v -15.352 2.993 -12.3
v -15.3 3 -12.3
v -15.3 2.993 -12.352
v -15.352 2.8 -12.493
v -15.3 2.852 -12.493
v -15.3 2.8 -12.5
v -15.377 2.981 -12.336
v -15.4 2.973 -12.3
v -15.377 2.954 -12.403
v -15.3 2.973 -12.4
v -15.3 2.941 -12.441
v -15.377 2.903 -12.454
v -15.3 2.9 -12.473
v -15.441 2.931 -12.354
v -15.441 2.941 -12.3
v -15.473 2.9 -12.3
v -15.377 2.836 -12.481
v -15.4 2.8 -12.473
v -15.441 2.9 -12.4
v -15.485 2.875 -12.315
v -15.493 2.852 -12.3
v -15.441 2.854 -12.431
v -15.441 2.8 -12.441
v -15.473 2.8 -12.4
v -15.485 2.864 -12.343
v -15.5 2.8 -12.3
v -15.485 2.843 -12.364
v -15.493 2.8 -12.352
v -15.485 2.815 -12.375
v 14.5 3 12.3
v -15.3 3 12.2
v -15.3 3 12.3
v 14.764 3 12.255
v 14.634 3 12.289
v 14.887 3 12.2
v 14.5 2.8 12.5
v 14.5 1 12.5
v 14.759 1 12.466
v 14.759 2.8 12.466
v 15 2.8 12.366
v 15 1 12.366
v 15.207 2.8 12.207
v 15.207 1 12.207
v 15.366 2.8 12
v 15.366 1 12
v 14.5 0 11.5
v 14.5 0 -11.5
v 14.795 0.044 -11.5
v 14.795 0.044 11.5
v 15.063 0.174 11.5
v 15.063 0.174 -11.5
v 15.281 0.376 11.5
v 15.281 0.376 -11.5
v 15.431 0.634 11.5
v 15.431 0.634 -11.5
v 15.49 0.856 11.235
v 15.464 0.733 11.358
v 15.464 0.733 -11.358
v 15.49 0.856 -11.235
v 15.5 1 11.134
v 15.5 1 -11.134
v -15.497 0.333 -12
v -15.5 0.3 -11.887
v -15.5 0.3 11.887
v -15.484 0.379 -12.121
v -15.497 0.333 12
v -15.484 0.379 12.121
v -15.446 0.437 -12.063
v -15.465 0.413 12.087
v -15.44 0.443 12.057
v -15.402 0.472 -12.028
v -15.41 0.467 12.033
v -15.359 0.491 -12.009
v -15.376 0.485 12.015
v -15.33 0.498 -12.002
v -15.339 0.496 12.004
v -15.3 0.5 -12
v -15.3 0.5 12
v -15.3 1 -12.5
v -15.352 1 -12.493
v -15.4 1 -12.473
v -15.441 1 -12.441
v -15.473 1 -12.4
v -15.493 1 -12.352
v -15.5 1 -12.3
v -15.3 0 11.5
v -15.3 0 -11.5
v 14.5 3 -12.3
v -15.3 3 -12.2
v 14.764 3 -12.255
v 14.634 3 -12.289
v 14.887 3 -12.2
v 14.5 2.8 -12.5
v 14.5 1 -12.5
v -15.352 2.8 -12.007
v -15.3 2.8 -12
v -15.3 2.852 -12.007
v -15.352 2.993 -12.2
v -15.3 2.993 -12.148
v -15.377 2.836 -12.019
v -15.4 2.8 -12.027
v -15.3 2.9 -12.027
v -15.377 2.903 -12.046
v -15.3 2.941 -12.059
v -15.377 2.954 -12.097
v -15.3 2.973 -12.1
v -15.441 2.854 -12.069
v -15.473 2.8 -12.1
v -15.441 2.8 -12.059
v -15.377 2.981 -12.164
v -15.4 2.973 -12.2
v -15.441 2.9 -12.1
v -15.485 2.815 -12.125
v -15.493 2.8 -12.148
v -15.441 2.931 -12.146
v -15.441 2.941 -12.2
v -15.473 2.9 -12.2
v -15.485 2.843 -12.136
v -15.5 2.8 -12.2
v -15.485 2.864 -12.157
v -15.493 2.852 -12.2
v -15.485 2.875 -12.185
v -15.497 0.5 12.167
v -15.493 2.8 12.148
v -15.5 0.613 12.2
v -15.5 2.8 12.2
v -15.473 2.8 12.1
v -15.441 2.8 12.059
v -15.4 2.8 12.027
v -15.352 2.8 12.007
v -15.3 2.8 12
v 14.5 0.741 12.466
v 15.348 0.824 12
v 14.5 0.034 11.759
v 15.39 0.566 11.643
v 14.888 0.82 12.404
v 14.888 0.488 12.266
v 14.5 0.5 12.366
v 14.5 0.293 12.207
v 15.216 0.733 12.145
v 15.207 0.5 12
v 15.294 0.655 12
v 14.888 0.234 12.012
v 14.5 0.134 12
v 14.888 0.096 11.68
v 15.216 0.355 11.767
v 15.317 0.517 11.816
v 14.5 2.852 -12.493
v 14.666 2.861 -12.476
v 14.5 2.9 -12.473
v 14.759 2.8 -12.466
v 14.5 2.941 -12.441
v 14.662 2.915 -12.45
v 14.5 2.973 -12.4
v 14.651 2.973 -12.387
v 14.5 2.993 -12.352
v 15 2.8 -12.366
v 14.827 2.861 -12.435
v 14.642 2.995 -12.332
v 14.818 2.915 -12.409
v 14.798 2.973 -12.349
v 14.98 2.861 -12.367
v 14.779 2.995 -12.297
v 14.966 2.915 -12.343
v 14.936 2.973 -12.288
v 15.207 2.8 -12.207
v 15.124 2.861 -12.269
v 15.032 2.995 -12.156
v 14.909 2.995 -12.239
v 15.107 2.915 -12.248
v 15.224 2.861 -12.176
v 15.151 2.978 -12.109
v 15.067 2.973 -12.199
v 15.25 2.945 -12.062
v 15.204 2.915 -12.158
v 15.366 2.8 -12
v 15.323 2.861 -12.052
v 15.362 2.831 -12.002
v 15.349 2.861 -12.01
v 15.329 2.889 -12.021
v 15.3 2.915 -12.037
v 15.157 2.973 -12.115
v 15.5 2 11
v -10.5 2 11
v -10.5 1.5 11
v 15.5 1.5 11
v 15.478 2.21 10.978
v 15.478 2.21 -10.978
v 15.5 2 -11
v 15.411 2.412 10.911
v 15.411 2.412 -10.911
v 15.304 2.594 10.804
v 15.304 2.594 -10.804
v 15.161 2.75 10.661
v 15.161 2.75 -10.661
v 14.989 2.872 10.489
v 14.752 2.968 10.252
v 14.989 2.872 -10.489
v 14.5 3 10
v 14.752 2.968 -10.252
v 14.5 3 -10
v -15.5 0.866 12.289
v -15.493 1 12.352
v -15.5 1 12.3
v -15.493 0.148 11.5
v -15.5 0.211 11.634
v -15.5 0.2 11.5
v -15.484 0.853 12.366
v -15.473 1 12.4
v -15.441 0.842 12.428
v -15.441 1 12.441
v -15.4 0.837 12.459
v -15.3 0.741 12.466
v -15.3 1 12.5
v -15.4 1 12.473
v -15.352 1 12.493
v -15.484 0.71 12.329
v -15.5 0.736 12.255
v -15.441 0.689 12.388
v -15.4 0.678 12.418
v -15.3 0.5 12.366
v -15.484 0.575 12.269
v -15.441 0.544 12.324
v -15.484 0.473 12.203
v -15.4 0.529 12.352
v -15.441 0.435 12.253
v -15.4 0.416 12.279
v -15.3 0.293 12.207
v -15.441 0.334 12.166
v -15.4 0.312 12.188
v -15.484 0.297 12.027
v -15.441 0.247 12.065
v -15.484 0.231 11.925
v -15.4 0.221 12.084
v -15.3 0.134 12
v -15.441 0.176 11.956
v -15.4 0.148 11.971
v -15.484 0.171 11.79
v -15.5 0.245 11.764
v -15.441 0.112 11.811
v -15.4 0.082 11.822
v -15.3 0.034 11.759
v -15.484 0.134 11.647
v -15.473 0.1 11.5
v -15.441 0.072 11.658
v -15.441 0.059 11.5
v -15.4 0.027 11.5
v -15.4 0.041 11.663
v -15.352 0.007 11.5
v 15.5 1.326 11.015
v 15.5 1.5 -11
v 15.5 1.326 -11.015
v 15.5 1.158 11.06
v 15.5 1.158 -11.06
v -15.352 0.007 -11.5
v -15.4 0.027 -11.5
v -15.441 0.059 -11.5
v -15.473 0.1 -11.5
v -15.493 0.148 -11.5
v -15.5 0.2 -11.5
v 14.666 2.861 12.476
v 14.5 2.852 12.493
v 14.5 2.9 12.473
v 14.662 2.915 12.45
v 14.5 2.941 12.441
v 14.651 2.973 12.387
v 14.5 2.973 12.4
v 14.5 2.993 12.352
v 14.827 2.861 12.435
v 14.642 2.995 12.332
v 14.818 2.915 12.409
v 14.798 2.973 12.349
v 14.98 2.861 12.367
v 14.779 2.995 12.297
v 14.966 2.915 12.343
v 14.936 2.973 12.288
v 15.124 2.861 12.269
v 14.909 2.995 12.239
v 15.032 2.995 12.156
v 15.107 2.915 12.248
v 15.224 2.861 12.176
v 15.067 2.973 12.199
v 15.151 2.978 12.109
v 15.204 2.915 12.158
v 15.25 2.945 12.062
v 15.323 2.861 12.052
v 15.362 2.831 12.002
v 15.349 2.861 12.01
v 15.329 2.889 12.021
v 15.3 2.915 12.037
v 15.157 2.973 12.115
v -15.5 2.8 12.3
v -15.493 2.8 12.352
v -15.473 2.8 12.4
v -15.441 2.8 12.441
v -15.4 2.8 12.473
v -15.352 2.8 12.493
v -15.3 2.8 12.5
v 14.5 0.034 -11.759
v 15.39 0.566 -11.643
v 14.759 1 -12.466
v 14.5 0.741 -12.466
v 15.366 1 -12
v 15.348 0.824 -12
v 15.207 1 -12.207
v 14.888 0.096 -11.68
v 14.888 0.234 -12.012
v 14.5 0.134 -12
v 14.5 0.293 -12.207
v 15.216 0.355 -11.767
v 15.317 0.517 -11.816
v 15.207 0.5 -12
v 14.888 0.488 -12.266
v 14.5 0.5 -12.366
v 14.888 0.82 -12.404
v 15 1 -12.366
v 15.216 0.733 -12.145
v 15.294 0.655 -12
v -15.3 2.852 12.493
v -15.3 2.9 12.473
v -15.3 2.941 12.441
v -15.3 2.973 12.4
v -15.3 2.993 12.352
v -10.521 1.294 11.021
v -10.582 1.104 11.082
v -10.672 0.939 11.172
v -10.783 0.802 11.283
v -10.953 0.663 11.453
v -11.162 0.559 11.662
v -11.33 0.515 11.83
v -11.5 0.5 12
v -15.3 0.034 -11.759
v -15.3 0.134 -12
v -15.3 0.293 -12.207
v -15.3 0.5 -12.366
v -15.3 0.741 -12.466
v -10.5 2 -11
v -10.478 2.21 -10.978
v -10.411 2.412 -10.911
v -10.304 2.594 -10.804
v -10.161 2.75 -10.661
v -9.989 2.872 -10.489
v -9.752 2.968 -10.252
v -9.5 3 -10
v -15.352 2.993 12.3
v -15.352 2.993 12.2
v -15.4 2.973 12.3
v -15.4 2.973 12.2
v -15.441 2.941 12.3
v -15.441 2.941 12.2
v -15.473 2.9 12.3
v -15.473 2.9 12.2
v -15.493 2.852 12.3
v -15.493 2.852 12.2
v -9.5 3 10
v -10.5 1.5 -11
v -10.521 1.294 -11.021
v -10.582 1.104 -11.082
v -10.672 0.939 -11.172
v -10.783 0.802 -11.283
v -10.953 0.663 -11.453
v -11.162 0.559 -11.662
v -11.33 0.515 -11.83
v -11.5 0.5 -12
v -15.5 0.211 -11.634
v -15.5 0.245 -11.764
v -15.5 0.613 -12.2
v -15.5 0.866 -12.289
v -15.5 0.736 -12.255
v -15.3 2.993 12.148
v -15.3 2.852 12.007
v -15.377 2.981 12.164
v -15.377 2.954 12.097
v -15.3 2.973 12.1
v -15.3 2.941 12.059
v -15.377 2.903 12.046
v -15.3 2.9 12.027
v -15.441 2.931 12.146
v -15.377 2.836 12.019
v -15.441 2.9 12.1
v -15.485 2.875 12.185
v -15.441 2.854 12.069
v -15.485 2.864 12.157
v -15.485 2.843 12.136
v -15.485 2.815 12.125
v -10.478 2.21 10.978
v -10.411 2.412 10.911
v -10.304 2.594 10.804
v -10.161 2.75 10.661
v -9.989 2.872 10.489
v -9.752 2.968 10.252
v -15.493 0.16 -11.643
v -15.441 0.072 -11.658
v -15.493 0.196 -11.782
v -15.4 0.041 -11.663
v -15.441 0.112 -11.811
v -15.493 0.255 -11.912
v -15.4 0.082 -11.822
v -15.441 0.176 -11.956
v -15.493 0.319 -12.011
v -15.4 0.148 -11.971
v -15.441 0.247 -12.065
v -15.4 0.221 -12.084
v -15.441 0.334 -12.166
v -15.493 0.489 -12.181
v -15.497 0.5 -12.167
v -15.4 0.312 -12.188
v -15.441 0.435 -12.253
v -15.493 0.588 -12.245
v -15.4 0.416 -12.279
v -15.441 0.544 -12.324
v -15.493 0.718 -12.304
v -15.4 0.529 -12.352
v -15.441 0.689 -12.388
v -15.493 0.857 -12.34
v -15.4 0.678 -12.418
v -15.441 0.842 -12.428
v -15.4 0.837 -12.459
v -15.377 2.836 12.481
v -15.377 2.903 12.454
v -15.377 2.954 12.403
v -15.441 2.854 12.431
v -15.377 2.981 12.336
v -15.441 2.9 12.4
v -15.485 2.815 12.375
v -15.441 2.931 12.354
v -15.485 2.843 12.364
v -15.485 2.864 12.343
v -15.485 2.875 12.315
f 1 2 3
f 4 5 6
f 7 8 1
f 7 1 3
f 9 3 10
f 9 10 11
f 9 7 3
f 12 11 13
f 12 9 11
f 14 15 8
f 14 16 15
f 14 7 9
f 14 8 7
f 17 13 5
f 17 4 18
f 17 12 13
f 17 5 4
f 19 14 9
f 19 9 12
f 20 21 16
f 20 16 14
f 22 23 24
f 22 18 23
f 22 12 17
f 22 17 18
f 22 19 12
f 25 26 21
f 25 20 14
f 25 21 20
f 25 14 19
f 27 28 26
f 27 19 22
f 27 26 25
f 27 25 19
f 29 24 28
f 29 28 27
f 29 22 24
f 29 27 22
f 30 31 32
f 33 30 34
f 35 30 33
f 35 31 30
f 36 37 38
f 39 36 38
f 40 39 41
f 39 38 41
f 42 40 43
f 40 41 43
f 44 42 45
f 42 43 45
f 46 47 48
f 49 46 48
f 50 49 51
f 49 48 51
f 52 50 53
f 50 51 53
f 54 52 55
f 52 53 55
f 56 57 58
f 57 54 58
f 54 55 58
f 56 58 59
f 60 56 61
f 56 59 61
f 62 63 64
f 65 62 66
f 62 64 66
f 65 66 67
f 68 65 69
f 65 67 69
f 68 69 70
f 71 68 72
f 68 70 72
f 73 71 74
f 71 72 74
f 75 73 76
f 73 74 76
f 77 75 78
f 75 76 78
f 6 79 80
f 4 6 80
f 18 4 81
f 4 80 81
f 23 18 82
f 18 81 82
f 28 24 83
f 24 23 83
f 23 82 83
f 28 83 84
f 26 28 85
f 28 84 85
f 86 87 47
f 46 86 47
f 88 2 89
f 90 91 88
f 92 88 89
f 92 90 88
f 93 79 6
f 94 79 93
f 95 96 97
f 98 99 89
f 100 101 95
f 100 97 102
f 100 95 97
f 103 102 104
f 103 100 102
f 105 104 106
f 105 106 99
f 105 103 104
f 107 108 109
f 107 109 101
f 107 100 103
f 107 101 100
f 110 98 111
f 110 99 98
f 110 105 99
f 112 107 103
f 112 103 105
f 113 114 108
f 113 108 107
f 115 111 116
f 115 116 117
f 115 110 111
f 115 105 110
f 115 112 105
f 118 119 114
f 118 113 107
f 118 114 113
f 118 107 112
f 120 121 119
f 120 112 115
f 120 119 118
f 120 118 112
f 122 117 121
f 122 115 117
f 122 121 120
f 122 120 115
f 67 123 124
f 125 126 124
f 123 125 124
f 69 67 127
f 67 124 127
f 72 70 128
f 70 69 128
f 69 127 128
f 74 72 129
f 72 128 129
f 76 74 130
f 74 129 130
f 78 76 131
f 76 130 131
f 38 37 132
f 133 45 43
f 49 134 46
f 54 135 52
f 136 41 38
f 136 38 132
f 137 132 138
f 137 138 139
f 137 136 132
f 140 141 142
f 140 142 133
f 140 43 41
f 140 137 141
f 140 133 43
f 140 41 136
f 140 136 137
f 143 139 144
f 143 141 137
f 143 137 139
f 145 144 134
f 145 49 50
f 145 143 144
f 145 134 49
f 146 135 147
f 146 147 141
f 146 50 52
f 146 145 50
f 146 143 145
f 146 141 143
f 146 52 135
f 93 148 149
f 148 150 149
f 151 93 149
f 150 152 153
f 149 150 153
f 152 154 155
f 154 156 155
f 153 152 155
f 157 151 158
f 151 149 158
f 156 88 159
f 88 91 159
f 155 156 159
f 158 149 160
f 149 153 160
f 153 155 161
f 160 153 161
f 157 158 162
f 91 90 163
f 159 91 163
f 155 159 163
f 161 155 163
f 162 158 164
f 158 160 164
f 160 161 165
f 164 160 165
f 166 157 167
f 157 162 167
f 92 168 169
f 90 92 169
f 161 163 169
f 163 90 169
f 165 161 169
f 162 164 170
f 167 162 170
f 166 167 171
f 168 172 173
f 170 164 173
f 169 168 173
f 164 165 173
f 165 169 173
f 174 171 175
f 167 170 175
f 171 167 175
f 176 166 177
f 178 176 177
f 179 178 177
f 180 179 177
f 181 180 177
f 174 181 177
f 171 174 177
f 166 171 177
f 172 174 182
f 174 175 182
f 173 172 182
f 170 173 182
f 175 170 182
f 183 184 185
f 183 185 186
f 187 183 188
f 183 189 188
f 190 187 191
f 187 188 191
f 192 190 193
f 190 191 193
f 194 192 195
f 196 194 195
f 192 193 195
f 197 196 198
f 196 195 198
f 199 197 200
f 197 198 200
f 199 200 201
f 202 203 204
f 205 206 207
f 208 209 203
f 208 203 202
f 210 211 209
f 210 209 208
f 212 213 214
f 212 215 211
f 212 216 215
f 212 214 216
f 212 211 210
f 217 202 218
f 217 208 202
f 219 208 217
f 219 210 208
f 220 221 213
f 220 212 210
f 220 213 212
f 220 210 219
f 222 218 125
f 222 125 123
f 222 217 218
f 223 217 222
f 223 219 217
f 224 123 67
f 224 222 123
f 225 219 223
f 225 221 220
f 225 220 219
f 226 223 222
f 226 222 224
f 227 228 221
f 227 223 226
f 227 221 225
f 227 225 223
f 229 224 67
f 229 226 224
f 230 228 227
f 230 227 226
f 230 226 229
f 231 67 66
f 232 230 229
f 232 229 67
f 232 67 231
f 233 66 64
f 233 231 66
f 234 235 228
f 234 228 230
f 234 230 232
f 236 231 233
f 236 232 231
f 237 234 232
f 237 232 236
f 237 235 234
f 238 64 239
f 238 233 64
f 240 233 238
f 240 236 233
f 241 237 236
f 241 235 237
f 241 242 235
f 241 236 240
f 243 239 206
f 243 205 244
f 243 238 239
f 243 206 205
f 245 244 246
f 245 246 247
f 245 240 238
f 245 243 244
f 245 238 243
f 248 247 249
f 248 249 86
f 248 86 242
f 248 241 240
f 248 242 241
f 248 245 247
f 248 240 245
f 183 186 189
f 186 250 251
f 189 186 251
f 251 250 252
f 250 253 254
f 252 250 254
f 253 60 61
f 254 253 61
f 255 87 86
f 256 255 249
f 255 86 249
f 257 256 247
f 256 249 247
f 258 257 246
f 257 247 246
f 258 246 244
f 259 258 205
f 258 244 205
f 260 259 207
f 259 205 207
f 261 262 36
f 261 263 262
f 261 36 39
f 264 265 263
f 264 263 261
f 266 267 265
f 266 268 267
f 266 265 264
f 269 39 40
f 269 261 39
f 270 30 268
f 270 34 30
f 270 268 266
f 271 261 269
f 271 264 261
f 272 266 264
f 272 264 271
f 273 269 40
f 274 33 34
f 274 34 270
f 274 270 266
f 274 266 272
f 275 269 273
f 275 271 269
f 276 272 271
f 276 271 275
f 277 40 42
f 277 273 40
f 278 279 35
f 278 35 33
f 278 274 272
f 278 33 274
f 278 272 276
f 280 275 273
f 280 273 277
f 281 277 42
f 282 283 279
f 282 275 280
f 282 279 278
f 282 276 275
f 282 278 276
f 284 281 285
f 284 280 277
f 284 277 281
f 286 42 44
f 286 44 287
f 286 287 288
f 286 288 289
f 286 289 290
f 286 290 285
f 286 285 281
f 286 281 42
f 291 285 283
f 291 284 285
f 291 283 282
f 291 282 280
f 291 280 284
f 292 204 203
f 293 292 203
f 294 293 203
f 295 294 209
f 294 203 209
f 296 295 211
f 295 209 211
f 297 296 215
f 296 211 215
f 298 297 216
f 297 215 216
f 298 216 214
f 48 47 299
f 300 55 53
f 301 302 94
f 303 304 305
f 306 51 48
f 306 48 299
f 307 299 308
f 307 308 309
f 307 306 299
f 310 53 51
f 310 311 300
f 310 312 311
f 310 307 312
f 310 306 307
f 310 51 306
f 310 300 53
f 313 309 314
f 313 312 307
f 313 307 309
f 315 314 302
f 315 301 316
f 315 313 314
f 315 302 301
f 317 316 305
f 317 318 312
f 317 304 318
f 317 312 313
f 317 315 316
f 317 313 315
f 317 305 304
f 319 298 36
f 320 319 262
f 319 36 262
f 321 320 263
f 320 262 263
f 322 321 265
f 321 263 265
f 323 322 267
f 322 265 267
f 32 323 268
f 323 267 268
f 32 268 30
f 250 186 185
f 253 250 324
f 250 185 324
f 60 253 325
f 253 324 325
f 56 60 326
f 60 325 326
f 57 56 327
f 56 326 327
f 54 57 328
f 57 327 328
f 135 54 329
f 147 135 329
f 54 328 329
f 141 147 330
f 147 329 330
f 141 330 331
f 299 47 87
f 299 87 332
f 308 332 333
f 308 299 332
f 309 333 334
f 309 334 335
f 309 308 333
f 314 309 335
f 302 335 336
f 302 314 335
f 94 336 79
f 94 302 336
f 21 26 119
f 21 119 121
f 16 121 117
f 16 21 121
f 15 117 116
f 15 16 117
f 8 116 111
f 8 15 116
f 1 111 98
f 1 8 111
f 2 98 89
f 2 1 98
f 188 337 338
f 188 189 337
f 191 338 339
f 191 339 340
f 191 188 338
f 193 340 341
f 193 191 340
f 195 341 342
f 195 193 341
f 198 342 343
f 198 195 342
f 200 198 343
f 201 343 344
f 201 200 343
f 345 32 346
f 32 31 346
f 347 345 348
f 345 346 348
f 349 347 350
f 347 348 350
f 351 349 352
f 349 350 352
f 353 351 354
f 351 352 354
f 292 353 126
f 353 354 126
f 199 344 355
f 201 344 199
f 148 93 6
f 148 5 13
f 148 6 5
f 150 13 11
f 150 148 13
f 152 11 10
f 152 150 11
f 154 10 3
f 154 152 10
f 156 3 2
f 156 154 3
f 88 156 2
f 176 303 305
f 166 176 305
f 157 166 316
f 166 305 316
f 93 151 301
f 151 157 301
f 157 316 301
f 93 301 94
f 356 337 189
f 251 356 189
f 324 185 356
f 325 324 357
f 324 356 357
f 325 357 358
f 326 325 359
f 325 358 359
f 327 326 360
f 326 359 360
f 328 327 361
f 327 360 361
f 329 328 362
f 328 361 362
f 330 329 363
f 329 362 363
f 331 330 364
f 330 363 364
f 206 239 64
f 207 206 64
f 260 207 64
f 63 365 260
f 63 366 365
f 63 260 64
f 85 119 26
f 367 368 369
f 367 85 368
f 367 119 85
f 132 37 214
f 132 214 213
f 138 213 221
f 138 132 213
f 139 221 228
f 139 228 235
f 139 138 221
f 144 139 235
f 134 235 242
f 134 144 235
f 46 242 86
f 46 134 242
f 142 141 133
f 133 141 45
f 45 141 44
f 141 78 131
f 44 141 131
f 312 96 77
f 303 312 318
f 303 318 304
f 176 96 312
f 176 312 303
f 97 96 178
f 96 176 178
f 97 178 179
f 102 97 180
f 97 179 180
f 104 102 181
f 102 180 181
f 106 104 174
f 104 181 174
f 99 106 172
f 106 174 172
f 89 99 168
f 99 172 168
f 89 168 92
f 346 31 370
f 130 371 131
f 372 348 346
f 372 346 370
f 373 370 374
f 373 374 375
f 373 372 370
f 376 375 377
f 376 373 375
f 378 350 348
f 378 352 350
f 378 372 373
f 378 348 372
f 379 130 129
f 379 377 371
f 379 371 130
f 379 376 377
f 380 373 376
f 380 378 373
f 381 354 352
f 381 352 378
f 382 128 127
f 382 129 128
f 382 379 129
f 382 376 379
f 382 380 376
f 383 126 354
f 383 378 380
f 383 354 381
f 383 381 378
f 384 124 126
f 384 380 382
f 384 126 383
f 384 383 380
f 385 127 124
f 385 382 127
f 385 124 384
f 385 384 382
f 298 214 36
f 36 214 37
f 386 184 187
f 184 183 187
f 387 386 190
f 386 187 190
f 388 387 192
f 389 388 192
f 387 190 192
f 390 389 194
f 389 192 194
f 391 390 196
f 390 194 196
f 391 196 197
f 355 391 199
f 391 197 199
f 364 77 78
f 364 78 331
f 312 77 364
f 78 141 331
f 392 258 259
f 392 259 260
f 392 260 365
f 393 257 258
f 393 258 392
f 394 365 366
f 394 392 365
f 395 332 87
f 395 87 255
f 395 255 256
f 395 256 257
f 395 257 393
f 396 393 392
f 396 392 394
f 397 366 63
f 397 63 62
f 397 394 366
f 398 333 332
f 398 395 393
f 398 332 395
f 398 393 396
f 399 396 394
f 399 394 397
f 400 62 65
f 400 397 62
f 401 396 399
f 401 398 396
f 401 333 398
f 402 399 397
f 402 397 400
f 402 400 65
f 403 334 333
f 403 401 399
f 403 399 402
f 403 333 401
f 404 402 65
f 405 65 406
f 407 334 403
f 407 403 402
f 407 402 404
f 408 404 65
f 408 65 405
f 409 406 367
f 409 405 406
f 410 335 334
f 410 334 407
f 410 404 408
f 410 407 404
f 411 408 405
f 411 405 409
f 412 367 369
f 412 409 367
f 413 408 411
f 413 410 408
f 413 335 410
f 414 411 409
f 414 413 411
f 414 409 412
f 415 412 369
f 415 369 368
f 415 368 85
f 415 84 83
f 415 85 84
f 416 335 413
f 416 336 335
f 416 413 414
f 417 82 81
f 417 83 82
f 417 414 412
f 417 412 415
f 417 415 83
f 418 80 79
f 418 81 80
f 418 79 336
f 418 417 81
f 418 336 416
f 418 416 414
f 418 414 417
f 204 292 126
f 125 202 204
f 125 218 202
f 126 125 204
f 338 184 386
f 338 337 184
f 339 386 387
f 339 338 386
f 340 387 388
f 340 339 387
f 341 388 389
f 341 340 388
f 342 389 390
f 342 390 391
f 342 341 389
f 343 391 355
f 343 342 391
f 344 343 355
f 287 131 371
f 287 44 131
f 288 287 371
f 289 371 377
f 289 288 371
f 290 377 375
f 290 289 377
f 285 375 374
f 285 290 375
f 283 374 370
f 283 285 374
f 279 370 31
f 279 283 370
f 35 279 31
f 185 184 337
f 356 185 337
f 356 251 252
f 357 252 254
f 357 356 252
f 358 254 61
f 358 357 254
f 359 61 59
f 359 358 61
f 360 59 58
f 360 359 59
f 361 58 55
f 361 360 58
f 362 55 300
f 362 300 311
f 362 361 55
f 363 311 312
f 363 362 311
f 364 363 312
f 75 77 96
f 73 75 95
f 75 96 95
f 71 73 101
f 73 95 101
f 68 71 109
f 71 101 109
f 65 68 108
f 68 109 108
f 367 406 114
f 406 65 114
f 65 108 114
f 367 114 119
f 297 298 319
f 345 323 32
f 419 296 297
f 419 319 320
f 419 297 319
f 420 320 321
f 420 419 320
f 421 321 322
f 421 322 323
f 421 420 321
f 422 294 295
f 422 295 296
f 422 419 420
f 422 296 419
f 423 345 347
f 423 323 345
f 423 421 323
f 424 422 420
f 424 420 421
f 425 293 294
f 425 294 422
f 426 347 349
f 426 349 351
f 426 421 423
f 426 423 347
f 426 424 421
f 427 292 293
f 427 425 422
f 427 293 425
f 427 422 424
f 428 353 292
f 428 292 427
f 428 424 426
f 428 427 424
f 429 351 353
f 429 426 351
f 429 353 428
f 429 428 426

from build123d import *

# Parameters (mm, degrees)
SKETCH_2_W          = 31
SKETCH_2_H          = 25
EXTRUDE_1_DEPTH     = 3
SKETCH_3_W          = 31
SKETCH_3_H          = 1
CUT_EXTRUDE_1_DEPTH = 2.5
SKETCH_4_W          = 5
SKETCH_4_H          = 22
CUT_EXTRUDE_2_DEPTH = 2.5
FILLET_11_R         = 1
FILLET_12_R         = 1
FILLET_13_R         = 1
FILLET_18_R         = 1
FILLET_19_R         = 1
FILLET_20_R         = 1
FILLET_21_R         = 1
FILLET_22_R         = 0.2
FILLET_23_R         = 0.2
FILLET_24_R         = 0.2


# Some blends are built 0.0001 mm under size
with BuildPart() as part:
    # 草图2 → 凸台-拉伸1 (new body)
    with BuildSketch(Plane(origin=(0, 0, 0), x_dir=(1, 0, 0), z_dir=(0, 1, 0))):
        Rectangle(SKETCH_2_W, SKETCH_2_H)
    extrude(amount=EXTRUDE_1_DEPTH)

    # 草图3 → 切除-拉伸1 (cut)
    with BuildSketch(Plane(origin=(0, 3, 0), x_dir=(1, 0, 0), z_dir=(0, 1, 0))):
        with Locations((0, 11.5)):
            Rectangle(SKETCH_3_W, SKETCH_3_H)
        with Locations((0, -11.5)):
            Rectangle(SKETCH_3_W, SKETCH_3_H)
    extrude(amount=-CUT_EXTRUDE_1_DEPTH, mode=Mode.SUBTRACT)

    # 草图4 → 切除-拉伸2 (cut)
    with BuildSketch(Plane(origin=(0, 3, 0), x_dir=(1, 0, 0), z_dir=(0, 1, 0))):
        with Locations((-13, 0)):
            Rectangle(SKETCH_4_W, SKETCH_4_H)
    extrude(amount=-CUT_EXTRUDE_2_DEPTH, mode=Mode.SUBTRACT)

    # 圆角11
    fillet_11_edges = [part.edges().sort_by_distance(p)[0] for p in [
        (0, 0, 12.5),
    ]]
    fillet(fillet_11_edges, radius=FILLET_11_R)

    # 圆角12
    fillet_12_edges = [part.edges().sort_by_distance(p)[0] for p in [
        (0, 0, -12.5),
    ]]
    fillet(fillet_12_edges, radius=FILLET_12_R)

    # 圆角13
    # the kernel refuses this fillet: 1 mm, written as the material it takes off along each edge
    with BuildSketch(Plane(origin=(15.5, 1, 12.5), x_dir=(0, 0, -1), z_dir=(0, 1, 0))) as fillet_13_piece_1:
        with BuildLine():
            CenterArc((FILLET_13_R, FILLET_13_R), FILLET_13_R, 180, 90)
            Line((0, FILLET_13_R), (0, 0))
            Line((0, 0), (FILLET_13_R, 0))
        make_face()
    extrude(amount=4.5, mode=Mode.SUBTRACT)
    with BuildSketch(Plane(origin=(15.5, 1, -12.5), x_dir=(0, 0, 1), z_dir=(0, 1, 0))) as fillet_13_piece_2:
        with BuildLine():
            CenterArc((FILLET_13_R, -FILLET_13_R), FILLET_13_R, 90, 90)
            Line((0, -FILLET_13_R), (0, 0))
            Line((0, 0), (FILLET_13_R, 0))
        make_face()
    extrude(amount=4.5, mode=Mode.SUBTRACT)
    with BuildSketch(Plane(origin=(15.5, 0, -11.5), x_dir=(0, 1, 0), z_dir=(0, 0, 1))) as fillet_13_piece_3:
        with BuildLine():
            CenterArc((FILLET_13_R, FILLET_13_R), FILLET_13_R, 180, 90)
            Line((0, FILLET_13_R), (0, 0))
            Line((0, 0), (FILLET_13_R, 0))
        make_face()
    extrude(amount=23, mode=Mode.SUBTRACT)
    with BuildSketch(Plane(origin=(15.5, 1, -11.5), x_dir=(0, -1, 0), z_dir=(0, 0, 1))) as fillet_13_piece_4:
        with BuildLine():
            CenterArc((1 - FILLET_13_R, -FILLET_13_R), FILLET_13_R, 0, 90)
            Line((1, -FILLET_13_R), (1, 0))
            Line((1, 0), (1 - FILLET_13_R, 0))
        make_face()
    revolve(axis=Axis((15.5, 1, -11.5), (1, 0, 0)), revolution_arc=90, mode=Mode.SUBTRACT)
    with BuildSketch(Plane(origin=(15.5, 1, 11.5), x_dir=(0, 0, 1), z_dir=(0, 1, 0))) as fillet_13_piece_5:
        with BuildLine():
            CenterArc((1 - FILLET_13_R, -FILLET_13_R), FILLET_13_R, 0, 90)
            Line((1, -FILLET_13_R), (1, 0))
            Line((1, 0), (1 - FILLET_13_R, 0))
        make_face()
    revolve(axis=Axis((15.5, 1, 11.5), (1, 0, 0)), revolution_arc=90, mode=Mode.SUBTRACT)

    # 圆角18
    fillet_18_edges = [part.edges().sort_by_distance(p)[0] for p in [
        (15.5, 3, 0),
        (2.5, 3, 11),
        (2.5, 3, -11),
        (-10.5, 3, 0),
    ]]
    fillet(fillet_18_edges, radius=FILLET_18_R)

    # 圆角19
    fillet_19_edges = [part.edges().sort_by_distance(p)[0] for p in [
        (-10.5, 0.5, 0),
    ]]
    fillet(fillet_19_edges, radius=FILLET_19_R)

    # 圆角20
    fillet_20_edges = [part.edges().sort_by_distance(p)[0] for p in [
        (1.933012702, 0.5, -11),
    ]]
    fillet(fillet_20_edges, radius=FILLET_20_R - 0.0001)  # a hair under: the kernel refuses the full size

    # 圆角21
    fillet_21_edges = [part.edges().sort_by_distance(p)[0] for p in [
        (1.933012702, 0.5, 11),
    ]]
    fillet(fillet_21_edges, radius=FILLET_21_R - 0.0001)  # a hair under: the kernel refuses the full size

    # 圆角22
    fillet_22_edges = [part.edges().sort_by_distance(p)[0] for p in [
        (-15.5, 3, 12.25),
        (-0.5, 3, 12.5),
        (-0.066987298, 3, 12),
        (15, 3, 12.366025404),
    ]]
    fillet(fillet_22_edges, radius=FILLET_22_R)

    # 圆角23
    fillet_23_edges = [part.edges().sort_by_distance(p)[0] for p in [
        (-15.5, 3, -12.25),
        (-0.5, 3, -12.5),
        (-0.066987298, 3, -12),
        (15, 3, -12.366025404),
    ]]
    fillet(fillet_23_edges, radius=FILLET_23_R)

    # 圆角24
    # the kernel refuses this fillet: 0.2 mm, written as the material it takes off along each edge
    with BuildSketch(Plane(origin=(-15.3, 2.8, 12.2), x_dir=(0, 0, -1), z_dir=(-1, 0, 0))) as fillet_24_piece_1_section:
        Polygon((0, 0), (FILLET_24_R, 0), (FILLET_24_R, -FILLET_24_R), (0, -FILLET_24_R), align=None)
    fillet_24_piece_1 = extrude(amount=FILLET_24_R, mode=Mode.PRIVATE)
    fillet_24_piece_1 = fillet_24_piece_1 - Plane(origin=(-15.3, 2.8, 12.2), x_dir=(0, -0.7071067811865475, 0.7071067811865475), z_dir=(-1, 0, 0)) * Sphere(FILLET_24_R, mode=Mode.PRIVATE)
    add(fillet_24_piece_1, mode=Mode.SUBTRACT)
    with BuildSketch(Plane(origin=(-15.3, 2.8, 12.3), x_dir=(0, 0, 1), z_dir=(-1, 0, 0))) as fillet_24_piece_2_section:
        Polygon((0, 0), (FILLET_24_R, 0), (FILLET_24_R, FILLET_24_R), (0, FILLET_24_R), align=None)
    fillet_24_piece_2 = extrude(amount=FILLET_24_R, mode=Mode.PRIVATE)
    fillet_24_piece_2 = fillet_24_piece_2 - Plane(origin=(-15.3, 2.8, 12.3), x_dir=(0, -0.7071067811865475, -0.7071067811865475), z_dir=(-1, 0, 0)) * Sphere(FILLET_24_R, mode=Mode.PRIVATE)
    add(fillet_24_piece_2, mode=Mode.SUBTRACT)
    with BuildSketch(Plane(origin=(-15.3, 2.8, -12.3), x_dir=(0, 0, -1), z_dir=(-1, 0, 0))) as fillet_24_piece_3_section:
        Polygon((0, 0), (FILLET_24_R, 0), (FILLET_24_R, -FILLET_24_R), (0, -FILLET_24_R), align=None)
    fillet_24_piece_3 = extrude(amount=FILLET_24_R, mode=Mode.PRIVATE)
    fillet_24_piece_3 = fillet_24_piece_3 - Plane(origin=(-15.3, 2.8, -12.3), x_dir=(0, -0.7071067811865475, 0.7071067811865475), z_dir=(-1, 0, 0)) * Sphere(FILLET_24_R, mode=Mode.PRIVATE)
    add(fillet_24_piece_3, mode=Mode.SUBTRACT)
    with BuildSketch(Plane(origin=(-15.3, 2.8, -12.2), x_dir=(0, 0, 1), z_dir=(-1, 0, 0))) as fillet_24_piece_4_section:
        Polygon((0, 0), (FILLET_24_R, 0), (FILLET_24_R, FILLET_24_R), (0, FILLET_24_R), align=None)
    fillet_24_piece_4 = extrude(amount=FILLET_24_R, mode=Mode.PRIVATE)
    fillet_24_piece_4 = fillet_24_piece_4 - Plane(origin=(-15.3, 2.8, -12.2), x_dir=(0, -0.7071067811865475, -0.7071067811865475), z_dir=(-1, 0, 0)) * Sphere(FILLET_24_R, mode=Mode.PRIVATE)
    add(fillet_24_piece_4, mode=Mode.SUBTRACT)
    with BuildSketch(Plane(origin=(-15.5, 1, 12.5), x_dir=(0, 0, -1), z_dir=(0, 1, 0))) as fillet_24_piece_5:
        with BuildLine():
            CenterArc((FILLET_24_R, -FILLET_24_R), FILLET_24_R, 90, 90)
            Line((0, -FILLET_24_R), (0, 0))
            Line((0, 0), (FILLET_24_R, 0))
        make_face()
    extrude(amount=1.8, mode=Mode.SUBTRACT)
    with BuildSketch(Plane(origin=(-15.5, 1, -12.5), x_dir=(0, 0, 1), z_dir=(0, 1, 0))) as fillet_24_piece_6:
        with BuildLine():
            CenterArc((FILLET_24_R, FILLET_24_R), FILLET_24_R, 180, 90)
            Line((0, FILLET_24_R), (0, 0))
            Line((0, 0), (FILLET_24_R, 0))
        make_face()
    extrude(amount=1.8, mode=Mode.SUBTRACT)
    with BuildSketch(Plane(origin=(-15.5, 0.5, 12), x_dir=(0, -1, 0), z_dir=(0, 0, -1))) as fillet_24_piece_7:
        with BuildLine():
            CenterArc((FILLET_24_R, -FILLET_24_R), FILLET_24_R, 90, 90)
            Line((0, -FILLET_24_R), (0, 0))
            Line((0, 0), (FILLET_24_R, 0))
        make_face()
    extrude(amount=24, mode=Mode.SUBTRACT)
    with BuildSketch(Plane(origin=(-15.5, 2.8, -12), x_dir=(0, 0, -1), z_dir=(0, -1, 0))) as fillet_24_piece_8:
        with BuildLine():
            CenterArc((FILLET_24_R, FILLET_24_R), FILLET_24_R, 180, 90)
            Line((0, FILLET_24_R), (0, 0))
            Line((0, 0), (FILLET_24_R, 0))
        make_face()
    extrude(amount=2.3, mode=Mode.SUBTRACT)
    with BuildSketch(Plane(origin=(-15.5, 2.8, 12), x_dir=(0, 0, 1), z_dir=(0, -1, 0))) as fillet_24_piece_9:
        with BuildLine():
            CenterArc((FILLET_24_R, -FILLET_24_R), FILLET_24_R, 90, 90)
            Line((0, -FILLET_24_R), (0, 0))
            Line((0, 0), (FILLET_24_R, 0))
        make_face()
    extrude(amount=2.3, mode=Mode.SUBTRACT)
    with BuildSketch(Plane(origin=(-15.5, 1, 11.5), x_dir=(0, 0, 1), z_dir=(0, 1, 0))) as fillet_24_piece_10:
        with BuildLine():
            CenterArc((1 - FILLET_24_R, FILLET_24_R), FILLET_24_R, 270, 90)
            Line((1, FILLET_24_R), (1, 0))
            Line((1, 0), (1 - FILLET_24_R, 0))
        make_face()
    revolve(axis=Axis((-15.5, 1, 11.5), (1, 0, 0)), revolution_arc=90, mode=Mode.SUBTRACT)
    with BuildSketch(Plane(origin=(-15.5, 0, 11.5), x_dir=(0, 1, 0), z_dir=(0, 0, -1))) as fillet_24_piece_11:
        with BuildLine():
            CenterArc((FILLET_24_R, FILLET_24_R), FILLET_24_R, 180, 90)
            Line((0, FILLET_24_R), (0, 0))
            Line((0, 0), (FILLET_24_R, 0))
        make_face()
    extrude(amount=23, mode=Mode.SUBTRACT)
    with BuildSketch(Plane(origin=(-15.5, 1, -11.5), x_dir=(0, -1, 0), z_dir=(0, 0, 1))) as fillet_24_piece_12:
        with BuildLine():
            CenterArc((1 - FILLET_24_R, FILLET_24_R), FILLET_24_R, 270, 90)
            Line((1, FILLET_24_R), (1, 0))
            Line((1, 0), (1 - FILLET_24_R, 0))
        make_face()
    revolve(axis=Axis((-15.5, 1, -11.5), (1, 0, 0)), revolution_arc=90, mode=Mode.SUBTRACT)
    with BuildSketch(Plane(origin=(-15.5, 0.5, 12.5), x_dir=(0, -1, 0), z_dir=(0, 0, -1))) as fillet_24_piece_13a_section:
        with BuildLine():
            CenterArc((FILLET_24_R, -FILLET_24_R), FILLET_24_R, 90, 90)
            Line((0, -FILLET_24_R), (0, 0))
            Line((0, 0), (FILLET_24_R, 0))
        make_face()
    fillet_24_piece_13a = extrude(amount=24.5, mode=Mode.PRIVATE)
    fillet_24_piece_13a = split(fillet_24_piece_13a, bisect_by=Plane(origin=(-15.454720977, 0.454720977, 12), z_dir=(0, 0, 1)), keep=Keep.TOP, mode=Mode.PRIVATE)
    with BuildSketch(Plane(origin=(-15.5, 2.8, 12), x_dir=(0, 0, 1), z_dir=(0, -1, 0))) as fillet_24_piece_13b_section:
        with BuildLine():
            CenterArc((FILLET_24_R, -FILLET_24_R), FILLET_24_R, 90, 90)
            Line((0, -FILLET_24_R), (0, 0))
            Line((0, 0), (FILLET_24_R, 0))
        make_face()
    fillet_24_piece_13b = extrude(amount=2.8, mode=Mode.PRIVATE)
    fillet_24_piece_13b = split(fillet_24_piece_13b, bisect_by=Plane(origin=(-15.454720977, 0.5, 12.045279023), z_dir=(0, -1, 0)), keep=Keep.TOP, mode=Mode.PRIVATE)
    fillet_24_piece_13 = fillet_24_piece_13a & fillet_24_piece_13b
    add(fillet_24_piece_13, mode=Mode.SUBTRACT)
    with BuildSketch(Plane(origin=(-15.5, 2.8, -12), x_dir=(0, 0, -1), z_dir=(0, -1, 0))) as fillet_24_piece_14a_section:
        with BuildLine():
            CenterArc((FILLET_24_R, FILLET_24_R), FILLET_24_R, 180, 90)
            Line((0, FILLET_24_R), (0, 0))
            Line((0, 0), (FILLET_24_R, 0))
        make_face()
    fillet_24_piece_14a = extrude(amount=2.8, mode=Mode.PRIVATE)
    fillet_24_piece_14a = split(fillet_24_piece_14a, bisect_by=Plane(origin=(-15.454720977, 0.5, -12.045279023), z_dir=(0, -1, 0)), keep=Keep.TOP, mode=Mode.PRIVATE)
    with BuildSketch(Plane(origin=(-15.5, 0.5, 12), x_dir=(0, -1, 0), z_dir=(0, 0, -1))) as fillet_24_piece_14b_section:
        with BuildLine():
            CenterArc((FILLET_24_R, -FILLET_24_R), FILLET_24_R, 90, 90)
            Line((0, -FILLET_24_R), (0, 0))
            Line((0, 0), (FILLET_24_R, 0))
        make_face()
    fillet_24_piece_14b = extrude(amount=24.5, mode=Mode.PRIVATE)
    fillet_24_piece_14b = split(fillet_24_piece_14b, bisect_by=Plane(origin=(-15.454720977, 0.454720977, -12), z_dir=(0, 0, -1)), keep=Keep.TOP, mode=Mode.PRIVATE)
    fillet_24_piece_14 = fillet_24_piece_14a & fillet_24_piece_14b
    add(fillet_24_piece_14, mode=Mode.SUBTRACT)


solid = part.part
